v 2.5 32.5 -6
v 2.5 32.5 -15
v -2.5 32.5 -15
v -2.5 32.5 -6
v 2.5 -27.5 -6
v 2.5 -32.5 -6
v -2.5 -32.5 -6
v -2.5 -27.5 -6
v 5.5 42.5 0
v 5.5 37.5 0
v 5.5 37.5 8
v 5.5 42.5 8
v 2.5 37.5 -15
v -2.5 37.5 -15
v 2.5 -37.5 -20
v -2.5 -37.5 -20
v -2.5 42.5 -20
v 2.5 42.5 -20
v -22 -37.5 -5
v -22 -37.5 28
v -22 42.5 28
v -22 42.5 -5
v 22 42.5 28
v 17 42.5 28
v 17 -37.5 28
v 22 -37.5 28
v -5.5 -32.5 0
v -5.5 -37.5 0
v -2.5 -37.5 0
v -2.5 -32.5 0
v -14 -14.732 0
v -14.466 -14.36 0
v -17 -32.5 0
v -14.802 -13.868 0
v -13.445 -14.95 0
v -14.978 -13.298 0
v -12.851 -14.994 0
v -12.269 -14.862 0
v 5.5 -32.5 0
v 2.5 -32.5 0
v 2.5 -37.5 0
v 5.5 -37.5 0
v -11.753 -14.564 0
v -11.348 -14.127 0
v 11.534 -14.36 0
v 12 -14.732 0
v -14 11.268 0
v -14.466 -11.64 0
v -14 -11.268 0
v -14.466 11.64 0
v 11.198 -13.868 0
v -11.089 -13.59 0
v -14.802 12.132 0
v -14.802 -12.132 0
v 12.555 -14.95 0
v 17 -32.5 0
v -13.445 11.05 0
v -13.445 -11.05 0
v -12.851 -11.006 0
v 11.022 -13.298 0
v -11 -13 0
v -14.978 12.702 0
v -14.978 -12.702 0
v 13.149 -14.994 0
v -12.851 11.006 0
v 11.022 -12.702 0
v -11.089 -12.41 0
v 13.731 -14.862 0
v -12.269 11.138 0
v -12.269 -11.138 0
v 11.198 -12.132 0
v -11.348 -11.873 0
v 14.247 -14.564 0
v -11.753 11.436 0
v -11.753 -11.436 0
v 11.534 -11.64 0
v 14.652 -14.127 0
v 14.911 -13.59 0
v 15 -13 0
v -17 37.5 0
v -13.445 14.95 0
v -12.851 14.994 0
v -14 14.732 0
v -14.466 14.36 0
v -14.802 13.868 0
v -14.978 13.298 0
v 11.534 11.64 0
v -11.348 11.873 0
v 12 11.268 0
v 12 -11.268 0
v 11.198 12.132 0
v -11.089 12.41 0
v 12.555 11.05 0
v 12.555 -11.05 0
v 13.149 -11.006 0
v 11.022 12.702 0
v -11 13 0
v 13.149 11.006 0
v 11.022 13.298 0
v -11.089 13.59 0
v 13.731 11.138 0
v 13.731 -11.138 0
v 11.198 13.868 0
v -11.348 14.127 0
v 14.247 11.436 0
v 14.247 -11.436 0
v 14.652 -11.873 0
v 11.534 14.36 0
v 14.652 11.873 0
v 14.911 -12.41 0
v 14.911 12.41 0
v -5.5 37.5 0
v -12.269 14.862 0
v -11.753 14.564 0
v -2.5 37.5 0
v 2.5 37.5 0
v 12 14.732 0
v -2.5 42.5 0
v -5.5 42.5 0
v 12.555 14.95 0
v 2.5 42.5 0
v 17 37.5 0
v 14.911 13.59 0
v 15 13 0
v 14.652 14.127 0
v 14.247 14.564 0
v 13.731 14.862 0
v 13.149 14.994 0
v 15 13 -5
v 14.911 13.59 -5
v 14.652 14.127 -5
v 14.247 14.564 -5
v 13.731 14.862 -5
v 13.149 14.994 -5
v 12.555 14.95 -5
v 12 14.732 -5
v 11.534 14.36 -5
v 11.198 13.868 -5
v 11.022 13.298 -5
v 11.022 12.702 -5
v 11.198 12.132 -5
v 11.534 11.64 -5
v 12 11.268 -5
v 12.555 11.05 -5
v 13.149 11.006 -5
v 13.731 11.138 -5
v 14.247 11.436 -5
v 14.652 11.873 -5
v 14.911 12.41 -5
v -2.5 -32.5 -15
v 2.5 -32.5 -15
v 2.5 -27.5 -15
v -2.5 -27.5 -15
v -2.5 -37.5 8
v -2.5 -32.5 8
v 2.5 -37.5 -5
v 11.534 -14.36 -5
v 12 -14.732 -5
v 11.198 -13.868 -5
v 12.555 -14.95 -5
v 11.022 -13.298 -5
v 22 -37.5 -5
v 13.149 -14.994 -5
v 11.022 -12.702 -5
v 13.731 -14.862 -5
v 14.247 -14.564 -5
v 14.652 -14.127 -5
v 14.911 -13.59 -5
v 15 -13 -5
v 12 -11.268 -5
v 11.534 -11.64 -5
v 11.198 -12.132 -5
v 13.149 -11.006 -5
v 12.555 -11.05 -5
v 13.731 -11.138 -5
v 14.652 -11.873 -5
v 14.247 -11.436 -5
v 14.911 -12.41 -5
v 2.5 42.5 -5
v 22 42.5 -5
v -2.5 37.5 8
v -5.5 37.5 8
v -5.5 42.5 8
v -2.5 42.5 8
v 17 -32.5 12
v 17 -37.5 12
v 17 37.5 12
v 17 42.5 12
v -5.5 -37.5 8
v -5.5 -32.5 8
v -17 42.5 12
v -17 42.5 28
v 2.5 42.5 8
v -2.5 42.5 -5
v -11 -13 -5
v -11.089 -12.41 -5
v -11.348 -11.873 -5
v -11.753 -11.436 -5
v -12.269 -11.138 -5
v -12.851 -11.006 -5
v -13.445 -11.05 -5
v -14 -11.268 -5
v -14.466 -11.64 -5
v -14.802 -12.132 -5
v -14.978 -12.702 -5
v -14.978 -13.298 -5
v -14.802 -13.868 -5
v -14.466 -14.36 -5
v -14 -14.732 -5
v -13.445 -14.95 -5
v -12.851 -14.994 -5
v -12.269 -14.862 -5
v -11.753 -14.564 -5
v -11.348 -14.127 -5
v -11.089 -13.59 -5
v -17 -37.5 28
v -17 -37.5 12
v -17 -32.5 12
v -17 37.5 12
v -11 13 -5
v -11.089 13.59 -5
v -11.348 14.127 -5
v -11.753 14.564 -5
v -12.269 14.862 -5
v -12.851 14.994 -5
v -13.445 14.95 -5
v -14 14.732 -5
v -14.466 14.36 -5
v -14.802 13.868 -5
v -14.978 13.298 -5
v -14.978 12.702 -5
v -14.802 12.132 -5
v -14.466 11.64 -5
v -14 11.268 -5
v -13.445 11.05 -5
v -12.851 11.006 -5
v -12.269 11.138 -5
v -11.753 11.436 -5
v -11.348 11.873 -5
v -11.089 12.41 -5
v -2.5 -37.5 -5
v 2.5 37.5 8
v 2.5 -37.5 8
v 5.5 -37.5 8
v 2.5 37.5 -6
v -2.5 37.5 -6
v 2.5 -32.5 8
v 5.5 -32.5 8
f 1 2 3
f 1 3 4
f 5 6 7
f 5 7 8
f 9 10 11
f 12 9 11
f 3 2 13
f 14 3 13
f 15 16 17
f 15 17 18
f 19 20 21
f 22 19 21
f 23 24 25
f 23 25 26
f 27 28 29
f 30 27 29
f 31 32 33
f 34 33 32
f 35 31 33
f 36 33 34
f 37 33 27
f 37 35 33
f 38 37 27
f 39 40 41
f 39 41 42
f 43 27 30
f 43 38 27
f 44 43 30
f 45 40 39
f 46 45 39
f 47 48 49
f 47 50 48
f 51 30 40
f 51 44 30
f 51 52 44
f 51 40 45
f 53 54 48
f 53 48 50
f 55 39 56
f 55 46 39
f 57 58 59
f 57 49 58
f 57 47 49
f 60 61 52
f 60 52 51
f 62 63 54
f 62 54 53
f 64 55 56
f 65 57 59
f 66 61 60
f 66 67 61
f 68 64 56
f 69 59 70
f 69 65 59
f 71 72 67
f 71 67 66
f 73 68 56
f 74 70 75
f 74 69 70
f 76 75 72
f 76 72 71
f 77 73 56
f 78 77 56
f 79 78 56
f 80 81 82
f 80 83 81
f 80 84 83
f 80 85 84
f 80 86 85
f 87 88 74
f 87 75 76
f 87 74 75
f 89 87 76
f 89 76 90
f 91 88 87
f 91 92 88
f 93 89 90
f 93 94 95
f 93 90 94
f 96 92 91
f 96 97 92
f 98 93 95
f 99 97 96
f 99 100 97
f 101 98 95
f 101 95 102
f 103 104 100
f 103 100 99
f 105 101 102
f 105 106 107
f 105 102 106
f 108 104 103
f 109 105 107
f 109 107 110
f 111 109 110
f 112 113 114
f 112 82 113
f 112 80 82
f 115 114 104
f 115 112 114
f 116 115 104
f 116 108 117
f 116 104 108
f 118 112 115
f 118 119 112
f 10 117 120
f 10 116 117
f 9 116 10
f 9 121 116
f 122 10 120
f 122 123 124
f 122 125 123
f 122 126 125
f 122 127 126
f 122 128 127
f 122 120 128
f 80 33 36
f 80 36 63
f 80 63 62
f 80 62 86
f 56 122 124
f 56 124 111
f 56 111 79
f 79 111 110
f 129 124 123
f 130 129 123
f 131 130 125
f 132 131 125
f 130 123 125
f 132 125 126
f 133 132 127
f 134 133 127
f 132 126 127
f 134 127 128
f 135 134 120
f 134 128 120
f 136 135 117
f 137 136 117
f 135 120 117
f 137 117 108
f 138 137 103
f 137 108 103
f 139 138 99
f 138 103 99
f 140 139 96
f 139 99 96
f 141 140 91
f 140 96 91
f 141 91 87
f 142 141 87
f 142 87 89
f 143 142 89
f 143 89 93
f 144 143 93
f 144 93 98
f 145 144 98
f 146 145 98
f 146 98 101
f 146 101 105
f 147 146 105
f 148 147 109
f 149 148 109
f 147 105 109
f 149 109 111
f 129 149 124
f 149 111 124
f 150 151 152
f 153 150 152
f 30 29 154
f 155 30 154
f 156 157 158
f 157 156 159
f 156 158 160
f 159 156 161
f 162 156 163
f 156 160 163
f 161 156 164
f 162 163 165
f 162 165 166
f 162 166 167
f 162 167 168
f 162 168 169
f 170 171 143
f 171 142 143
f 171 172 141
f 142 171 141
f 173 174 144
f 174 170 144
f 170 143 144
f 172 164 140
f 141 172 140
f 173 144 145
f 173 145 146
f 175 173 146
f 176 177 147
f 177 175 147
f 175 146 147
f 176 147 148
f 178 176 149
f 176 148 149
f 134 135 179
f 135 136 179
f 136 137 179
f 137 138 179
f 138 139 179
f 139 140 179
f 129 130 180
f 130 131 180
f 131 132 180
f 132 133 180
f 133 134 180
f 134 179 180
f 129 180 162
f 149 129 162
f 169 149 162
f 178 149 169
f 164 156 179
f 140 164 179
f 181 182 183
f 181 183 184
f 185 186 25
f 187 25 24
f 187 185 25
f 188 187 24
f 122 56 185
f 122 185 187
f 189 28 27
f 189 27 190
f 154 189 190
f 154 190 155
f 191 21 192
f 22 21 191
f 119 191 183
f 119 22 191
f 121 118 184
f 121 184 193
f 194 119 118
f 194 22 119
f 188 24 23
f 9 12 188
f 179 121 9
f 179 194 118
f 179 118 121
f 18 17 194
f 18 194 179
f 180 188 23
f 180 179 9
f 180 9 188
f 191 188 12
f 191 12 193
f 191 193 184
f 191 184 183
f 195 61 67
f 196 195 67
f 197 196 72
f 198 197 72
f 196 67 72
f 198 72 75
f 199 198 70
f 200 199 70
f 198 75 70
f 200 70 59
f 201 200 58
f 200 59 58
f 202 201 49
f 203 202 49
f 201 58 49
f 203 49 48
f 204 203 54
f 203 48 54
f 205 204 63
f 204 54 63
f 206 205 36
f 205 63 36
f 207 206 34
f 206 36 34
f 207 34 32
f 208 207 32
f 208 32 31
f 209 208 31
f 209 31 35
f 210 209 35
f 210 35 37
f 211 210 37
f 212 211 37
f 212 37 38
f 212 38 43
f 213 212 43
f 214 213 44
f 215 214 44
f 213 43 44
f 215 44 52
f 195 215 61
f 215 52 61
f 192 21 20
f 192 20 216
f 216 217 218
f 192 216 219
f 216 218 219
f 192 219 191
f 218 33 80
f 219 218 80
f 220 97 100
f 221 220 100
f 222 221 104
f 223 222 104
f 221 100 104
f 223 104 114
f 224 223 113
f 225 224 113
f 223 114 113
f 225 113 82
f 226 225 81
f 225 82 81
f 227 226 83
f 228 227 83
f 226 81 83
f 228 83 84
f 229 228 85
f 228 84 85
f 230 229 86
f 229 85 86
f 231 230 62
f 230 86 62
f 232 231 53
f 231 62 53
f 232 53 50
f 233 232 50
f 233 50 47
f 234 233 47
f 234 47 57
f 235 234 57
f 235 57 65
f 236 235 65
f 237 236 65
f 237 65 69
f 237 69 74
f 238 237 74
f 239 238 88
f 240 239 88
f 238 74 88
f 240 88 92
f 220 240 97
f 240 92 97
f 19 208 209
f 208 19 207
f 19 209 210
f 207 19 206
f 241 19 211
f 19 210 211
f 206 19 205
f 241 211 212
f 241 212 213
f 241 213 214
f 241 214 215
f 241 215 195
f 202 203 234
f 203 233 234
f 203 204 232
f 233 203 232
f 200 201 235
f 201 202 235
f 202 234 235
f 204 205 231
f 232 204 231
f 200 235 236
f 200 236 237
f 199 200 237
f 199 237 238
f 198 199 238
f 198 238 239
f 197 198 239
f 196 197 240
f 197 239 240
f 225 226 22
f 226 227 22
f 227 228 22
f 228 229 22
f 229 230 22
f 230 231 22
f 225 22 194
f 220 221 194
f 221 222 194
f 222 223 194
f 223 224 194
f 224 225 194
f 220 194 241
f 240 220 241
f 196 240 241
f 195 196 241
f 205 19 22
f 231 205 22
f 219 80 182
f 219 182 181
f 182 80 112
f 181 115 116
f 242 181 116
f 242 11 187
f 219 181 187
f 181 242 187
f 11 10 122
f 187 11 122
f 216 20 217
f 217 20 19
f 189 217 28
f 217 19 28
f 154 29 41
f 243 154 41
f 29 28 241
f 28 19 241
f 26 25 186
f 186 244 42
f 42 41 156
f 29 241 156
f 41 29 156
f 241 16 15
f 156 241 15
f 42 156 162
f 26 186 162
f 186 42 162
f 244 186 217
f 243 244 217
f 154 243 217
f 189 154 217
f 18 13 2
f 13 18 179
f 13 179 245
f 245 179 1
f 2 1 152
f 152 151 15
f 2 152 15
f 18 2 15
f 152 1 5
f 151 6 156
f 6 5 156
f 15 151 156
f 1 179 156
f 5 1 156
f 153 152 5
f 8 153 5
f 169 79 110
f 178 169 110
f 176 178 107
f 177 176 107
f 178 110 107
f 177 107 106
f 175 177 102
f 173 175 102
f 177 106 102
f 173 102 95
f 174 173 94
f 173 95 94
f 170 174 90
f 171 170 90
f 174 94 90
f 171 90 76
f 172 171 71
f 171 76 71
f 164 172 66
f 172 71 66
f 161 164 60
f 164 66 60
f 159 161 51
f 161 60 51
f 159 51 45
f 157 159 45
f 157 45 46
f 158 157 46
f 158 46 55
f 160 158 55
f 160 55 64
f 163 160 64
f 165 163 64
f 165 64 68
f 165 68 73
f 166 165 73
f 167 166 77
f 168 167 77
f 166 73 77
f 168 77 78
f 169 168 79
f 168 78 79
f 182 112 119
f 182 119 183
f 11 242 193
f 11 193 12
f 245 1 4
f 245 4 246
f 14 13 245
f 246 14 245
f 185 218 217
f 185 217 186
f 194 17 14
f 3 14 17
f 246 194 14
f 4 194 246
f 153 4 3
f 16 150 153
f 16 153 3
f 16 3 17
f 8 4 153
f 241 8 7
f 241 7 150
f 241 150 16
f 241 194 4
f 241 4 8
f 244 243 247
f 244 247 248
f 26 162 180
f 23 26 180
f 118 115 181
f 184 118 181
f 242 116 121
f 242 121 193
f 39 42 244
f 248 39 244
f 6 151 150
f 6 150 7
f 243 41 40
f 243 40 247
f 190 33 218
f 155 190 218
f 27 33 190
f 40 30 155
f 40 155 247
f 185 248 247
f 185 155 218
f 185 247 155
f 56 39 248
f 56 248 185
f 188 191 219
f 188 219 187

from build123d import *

# Parameters (mm, degrees)
F1_DEPTH  = 28
F0_W      = 34
F0_H      = 70
F0_R      = 2
F0_H_2    = 5
F2_DEPTH  = 5
F3_DEPTH  = 12
F0_W_2    = 5
F4_DEPTH  = 5
F5_DEPTH  = 28
F6_DEPTH  = 12
F7_W      = 5
F7_H      = 80
F8_DEPTH  = 15
F9_W      = 5
F9_H      = 9
F10_DEPTH = 24.501
F11_W     = 3
F11_H     = 8
F12_DEPTH = 80.001
F13_DEPTH = 24.501


with BuildPart() as f1:
    # F0 (on Top) → F1 (new body)
    with BuildSketch(Plane.XY):
        Polygon((-17, 37.5), (-22, 37.5), (-22, -37.5), (-17, -37.5), (-17, -32.5), align=None)
        Polygon((22, 37.5), (17, 37.5), (17, -32.5), (17, -37.5), (22, -37.5), align=None)
    extrude(amount=F1_DEPTH)

    # F0 (on Top) → F2 (join)
    with BuildSketch(Plane.XY):
        Polygon((-17, 37.5), (-22, 37.5), (-22, -37.5), (-17, -37.5), (-17, -32.5), align=None)
        with Locations((0, 2.5)):
            Rectangle(F0_W, F0_H)
        with Locations((-13, -13)):
            Circle(F0_R, mode=Mode.SUBTRACT)
        with Locations((13, -13)):
            Circle(F0_R, mode=Mode.SUBTRACT)
        with Locations((-13, 13)):
            Circle(F0_R, mode=Mode.SUBTRACT)
        with Locations((13, 13)):
            Circle(F0_R, mode=Mode.SUBTRACT)
        Polygon((22, 37.5), (17, 37.5), (17, -32.5), (17, -37.5), (22, -37.5), align=None)
        with Locations((0, -35)):
            Rectangle(F0_W, F0_H_2)
    extrude(amount=-F2_DEPTH)

    # F0 (on Top) → F3 (join)
    with BuildSketch(Plane.XY):
        with Locations((0, -35)):
            Rectangle(F0_W, F0_H_2)
    extrude(amount=F3_DEPTH)

    # F0 (on Top) → F4 (join, through all)
    with BuildSketch(Plane.XY):
        with Locations((19.5, 40)):
            Rectangle(F0_W_2, F0_H_2)
        with Locations((0, 40)):
            Rectangle(F0_W, F0_H_2)
        with Locations((-19.5, 40)):
            Rectangle(F0_W_2, F0_H_2)
    extrude(amount=-F4_DEPTH)

    # F0 (on Top) → F5 (join, through all)
    with BuildSketch(Plane.XY):
        with Locations((19.5, 40)):
            Rectangle(F0_W_2, F0_H_2)
        with Locations((-19.5, 40)):
            Rectangle(F0_W_2, F0_H_2)
    extrude(amount=F5_DEPTH)

    # F0 (on Top) → F6 (join)
    with BuildSketch(Plane.XY):
        with Locations((0, 40)):
            Rectangle(F0_W, F0_H_2)
    extrude(amount=F6_DEPTH)

    # F7 (on face) → F8 (join)
    with BuildSketch(Plane(origin=(0, 0, -5), x_dir=(1, 0, 0), z_dir=(0, 0, -1))):
        with Locations((0, -2.5)):
            Rectangle(F7_W, F7_H)
    extrude(amount=F8_DEPTH)

    # F9 (on face) → F10 (cut, through all)
    with BuildSketch(Plane.YZ.offset(2.5)):
        with Locations((-30, -10.5)):
            Rectangle(F9_W, F9_H)
    extrude(amount=-F10_DEPTH, mode=Mode.SUBTRACT)

    # F11 (on face) → F12 (cut, through all)
    with BuildSketch(Plane.XZ.offset(37.5)):
        with Locations((-4, 4)):
            Rectangle(F11_W, F11_H)
        with Locations((4, 4)):
            Rectangle(F11_W, F11_H)
    extrude(amount=-F12_DEPTH, mode=Mode.SUBTRACT)

    # F9 (on face) → F13 (cut, through all)
    with BuildSketch(Plane.YZ.offset(2.5)):
        with Locations((35, -10.5)):
            Rectangle(F9_W, F9_H)
    extrude(amount=-F13_DEPTH, mode=Mode.SUBTRACT)


solid = f1.part
